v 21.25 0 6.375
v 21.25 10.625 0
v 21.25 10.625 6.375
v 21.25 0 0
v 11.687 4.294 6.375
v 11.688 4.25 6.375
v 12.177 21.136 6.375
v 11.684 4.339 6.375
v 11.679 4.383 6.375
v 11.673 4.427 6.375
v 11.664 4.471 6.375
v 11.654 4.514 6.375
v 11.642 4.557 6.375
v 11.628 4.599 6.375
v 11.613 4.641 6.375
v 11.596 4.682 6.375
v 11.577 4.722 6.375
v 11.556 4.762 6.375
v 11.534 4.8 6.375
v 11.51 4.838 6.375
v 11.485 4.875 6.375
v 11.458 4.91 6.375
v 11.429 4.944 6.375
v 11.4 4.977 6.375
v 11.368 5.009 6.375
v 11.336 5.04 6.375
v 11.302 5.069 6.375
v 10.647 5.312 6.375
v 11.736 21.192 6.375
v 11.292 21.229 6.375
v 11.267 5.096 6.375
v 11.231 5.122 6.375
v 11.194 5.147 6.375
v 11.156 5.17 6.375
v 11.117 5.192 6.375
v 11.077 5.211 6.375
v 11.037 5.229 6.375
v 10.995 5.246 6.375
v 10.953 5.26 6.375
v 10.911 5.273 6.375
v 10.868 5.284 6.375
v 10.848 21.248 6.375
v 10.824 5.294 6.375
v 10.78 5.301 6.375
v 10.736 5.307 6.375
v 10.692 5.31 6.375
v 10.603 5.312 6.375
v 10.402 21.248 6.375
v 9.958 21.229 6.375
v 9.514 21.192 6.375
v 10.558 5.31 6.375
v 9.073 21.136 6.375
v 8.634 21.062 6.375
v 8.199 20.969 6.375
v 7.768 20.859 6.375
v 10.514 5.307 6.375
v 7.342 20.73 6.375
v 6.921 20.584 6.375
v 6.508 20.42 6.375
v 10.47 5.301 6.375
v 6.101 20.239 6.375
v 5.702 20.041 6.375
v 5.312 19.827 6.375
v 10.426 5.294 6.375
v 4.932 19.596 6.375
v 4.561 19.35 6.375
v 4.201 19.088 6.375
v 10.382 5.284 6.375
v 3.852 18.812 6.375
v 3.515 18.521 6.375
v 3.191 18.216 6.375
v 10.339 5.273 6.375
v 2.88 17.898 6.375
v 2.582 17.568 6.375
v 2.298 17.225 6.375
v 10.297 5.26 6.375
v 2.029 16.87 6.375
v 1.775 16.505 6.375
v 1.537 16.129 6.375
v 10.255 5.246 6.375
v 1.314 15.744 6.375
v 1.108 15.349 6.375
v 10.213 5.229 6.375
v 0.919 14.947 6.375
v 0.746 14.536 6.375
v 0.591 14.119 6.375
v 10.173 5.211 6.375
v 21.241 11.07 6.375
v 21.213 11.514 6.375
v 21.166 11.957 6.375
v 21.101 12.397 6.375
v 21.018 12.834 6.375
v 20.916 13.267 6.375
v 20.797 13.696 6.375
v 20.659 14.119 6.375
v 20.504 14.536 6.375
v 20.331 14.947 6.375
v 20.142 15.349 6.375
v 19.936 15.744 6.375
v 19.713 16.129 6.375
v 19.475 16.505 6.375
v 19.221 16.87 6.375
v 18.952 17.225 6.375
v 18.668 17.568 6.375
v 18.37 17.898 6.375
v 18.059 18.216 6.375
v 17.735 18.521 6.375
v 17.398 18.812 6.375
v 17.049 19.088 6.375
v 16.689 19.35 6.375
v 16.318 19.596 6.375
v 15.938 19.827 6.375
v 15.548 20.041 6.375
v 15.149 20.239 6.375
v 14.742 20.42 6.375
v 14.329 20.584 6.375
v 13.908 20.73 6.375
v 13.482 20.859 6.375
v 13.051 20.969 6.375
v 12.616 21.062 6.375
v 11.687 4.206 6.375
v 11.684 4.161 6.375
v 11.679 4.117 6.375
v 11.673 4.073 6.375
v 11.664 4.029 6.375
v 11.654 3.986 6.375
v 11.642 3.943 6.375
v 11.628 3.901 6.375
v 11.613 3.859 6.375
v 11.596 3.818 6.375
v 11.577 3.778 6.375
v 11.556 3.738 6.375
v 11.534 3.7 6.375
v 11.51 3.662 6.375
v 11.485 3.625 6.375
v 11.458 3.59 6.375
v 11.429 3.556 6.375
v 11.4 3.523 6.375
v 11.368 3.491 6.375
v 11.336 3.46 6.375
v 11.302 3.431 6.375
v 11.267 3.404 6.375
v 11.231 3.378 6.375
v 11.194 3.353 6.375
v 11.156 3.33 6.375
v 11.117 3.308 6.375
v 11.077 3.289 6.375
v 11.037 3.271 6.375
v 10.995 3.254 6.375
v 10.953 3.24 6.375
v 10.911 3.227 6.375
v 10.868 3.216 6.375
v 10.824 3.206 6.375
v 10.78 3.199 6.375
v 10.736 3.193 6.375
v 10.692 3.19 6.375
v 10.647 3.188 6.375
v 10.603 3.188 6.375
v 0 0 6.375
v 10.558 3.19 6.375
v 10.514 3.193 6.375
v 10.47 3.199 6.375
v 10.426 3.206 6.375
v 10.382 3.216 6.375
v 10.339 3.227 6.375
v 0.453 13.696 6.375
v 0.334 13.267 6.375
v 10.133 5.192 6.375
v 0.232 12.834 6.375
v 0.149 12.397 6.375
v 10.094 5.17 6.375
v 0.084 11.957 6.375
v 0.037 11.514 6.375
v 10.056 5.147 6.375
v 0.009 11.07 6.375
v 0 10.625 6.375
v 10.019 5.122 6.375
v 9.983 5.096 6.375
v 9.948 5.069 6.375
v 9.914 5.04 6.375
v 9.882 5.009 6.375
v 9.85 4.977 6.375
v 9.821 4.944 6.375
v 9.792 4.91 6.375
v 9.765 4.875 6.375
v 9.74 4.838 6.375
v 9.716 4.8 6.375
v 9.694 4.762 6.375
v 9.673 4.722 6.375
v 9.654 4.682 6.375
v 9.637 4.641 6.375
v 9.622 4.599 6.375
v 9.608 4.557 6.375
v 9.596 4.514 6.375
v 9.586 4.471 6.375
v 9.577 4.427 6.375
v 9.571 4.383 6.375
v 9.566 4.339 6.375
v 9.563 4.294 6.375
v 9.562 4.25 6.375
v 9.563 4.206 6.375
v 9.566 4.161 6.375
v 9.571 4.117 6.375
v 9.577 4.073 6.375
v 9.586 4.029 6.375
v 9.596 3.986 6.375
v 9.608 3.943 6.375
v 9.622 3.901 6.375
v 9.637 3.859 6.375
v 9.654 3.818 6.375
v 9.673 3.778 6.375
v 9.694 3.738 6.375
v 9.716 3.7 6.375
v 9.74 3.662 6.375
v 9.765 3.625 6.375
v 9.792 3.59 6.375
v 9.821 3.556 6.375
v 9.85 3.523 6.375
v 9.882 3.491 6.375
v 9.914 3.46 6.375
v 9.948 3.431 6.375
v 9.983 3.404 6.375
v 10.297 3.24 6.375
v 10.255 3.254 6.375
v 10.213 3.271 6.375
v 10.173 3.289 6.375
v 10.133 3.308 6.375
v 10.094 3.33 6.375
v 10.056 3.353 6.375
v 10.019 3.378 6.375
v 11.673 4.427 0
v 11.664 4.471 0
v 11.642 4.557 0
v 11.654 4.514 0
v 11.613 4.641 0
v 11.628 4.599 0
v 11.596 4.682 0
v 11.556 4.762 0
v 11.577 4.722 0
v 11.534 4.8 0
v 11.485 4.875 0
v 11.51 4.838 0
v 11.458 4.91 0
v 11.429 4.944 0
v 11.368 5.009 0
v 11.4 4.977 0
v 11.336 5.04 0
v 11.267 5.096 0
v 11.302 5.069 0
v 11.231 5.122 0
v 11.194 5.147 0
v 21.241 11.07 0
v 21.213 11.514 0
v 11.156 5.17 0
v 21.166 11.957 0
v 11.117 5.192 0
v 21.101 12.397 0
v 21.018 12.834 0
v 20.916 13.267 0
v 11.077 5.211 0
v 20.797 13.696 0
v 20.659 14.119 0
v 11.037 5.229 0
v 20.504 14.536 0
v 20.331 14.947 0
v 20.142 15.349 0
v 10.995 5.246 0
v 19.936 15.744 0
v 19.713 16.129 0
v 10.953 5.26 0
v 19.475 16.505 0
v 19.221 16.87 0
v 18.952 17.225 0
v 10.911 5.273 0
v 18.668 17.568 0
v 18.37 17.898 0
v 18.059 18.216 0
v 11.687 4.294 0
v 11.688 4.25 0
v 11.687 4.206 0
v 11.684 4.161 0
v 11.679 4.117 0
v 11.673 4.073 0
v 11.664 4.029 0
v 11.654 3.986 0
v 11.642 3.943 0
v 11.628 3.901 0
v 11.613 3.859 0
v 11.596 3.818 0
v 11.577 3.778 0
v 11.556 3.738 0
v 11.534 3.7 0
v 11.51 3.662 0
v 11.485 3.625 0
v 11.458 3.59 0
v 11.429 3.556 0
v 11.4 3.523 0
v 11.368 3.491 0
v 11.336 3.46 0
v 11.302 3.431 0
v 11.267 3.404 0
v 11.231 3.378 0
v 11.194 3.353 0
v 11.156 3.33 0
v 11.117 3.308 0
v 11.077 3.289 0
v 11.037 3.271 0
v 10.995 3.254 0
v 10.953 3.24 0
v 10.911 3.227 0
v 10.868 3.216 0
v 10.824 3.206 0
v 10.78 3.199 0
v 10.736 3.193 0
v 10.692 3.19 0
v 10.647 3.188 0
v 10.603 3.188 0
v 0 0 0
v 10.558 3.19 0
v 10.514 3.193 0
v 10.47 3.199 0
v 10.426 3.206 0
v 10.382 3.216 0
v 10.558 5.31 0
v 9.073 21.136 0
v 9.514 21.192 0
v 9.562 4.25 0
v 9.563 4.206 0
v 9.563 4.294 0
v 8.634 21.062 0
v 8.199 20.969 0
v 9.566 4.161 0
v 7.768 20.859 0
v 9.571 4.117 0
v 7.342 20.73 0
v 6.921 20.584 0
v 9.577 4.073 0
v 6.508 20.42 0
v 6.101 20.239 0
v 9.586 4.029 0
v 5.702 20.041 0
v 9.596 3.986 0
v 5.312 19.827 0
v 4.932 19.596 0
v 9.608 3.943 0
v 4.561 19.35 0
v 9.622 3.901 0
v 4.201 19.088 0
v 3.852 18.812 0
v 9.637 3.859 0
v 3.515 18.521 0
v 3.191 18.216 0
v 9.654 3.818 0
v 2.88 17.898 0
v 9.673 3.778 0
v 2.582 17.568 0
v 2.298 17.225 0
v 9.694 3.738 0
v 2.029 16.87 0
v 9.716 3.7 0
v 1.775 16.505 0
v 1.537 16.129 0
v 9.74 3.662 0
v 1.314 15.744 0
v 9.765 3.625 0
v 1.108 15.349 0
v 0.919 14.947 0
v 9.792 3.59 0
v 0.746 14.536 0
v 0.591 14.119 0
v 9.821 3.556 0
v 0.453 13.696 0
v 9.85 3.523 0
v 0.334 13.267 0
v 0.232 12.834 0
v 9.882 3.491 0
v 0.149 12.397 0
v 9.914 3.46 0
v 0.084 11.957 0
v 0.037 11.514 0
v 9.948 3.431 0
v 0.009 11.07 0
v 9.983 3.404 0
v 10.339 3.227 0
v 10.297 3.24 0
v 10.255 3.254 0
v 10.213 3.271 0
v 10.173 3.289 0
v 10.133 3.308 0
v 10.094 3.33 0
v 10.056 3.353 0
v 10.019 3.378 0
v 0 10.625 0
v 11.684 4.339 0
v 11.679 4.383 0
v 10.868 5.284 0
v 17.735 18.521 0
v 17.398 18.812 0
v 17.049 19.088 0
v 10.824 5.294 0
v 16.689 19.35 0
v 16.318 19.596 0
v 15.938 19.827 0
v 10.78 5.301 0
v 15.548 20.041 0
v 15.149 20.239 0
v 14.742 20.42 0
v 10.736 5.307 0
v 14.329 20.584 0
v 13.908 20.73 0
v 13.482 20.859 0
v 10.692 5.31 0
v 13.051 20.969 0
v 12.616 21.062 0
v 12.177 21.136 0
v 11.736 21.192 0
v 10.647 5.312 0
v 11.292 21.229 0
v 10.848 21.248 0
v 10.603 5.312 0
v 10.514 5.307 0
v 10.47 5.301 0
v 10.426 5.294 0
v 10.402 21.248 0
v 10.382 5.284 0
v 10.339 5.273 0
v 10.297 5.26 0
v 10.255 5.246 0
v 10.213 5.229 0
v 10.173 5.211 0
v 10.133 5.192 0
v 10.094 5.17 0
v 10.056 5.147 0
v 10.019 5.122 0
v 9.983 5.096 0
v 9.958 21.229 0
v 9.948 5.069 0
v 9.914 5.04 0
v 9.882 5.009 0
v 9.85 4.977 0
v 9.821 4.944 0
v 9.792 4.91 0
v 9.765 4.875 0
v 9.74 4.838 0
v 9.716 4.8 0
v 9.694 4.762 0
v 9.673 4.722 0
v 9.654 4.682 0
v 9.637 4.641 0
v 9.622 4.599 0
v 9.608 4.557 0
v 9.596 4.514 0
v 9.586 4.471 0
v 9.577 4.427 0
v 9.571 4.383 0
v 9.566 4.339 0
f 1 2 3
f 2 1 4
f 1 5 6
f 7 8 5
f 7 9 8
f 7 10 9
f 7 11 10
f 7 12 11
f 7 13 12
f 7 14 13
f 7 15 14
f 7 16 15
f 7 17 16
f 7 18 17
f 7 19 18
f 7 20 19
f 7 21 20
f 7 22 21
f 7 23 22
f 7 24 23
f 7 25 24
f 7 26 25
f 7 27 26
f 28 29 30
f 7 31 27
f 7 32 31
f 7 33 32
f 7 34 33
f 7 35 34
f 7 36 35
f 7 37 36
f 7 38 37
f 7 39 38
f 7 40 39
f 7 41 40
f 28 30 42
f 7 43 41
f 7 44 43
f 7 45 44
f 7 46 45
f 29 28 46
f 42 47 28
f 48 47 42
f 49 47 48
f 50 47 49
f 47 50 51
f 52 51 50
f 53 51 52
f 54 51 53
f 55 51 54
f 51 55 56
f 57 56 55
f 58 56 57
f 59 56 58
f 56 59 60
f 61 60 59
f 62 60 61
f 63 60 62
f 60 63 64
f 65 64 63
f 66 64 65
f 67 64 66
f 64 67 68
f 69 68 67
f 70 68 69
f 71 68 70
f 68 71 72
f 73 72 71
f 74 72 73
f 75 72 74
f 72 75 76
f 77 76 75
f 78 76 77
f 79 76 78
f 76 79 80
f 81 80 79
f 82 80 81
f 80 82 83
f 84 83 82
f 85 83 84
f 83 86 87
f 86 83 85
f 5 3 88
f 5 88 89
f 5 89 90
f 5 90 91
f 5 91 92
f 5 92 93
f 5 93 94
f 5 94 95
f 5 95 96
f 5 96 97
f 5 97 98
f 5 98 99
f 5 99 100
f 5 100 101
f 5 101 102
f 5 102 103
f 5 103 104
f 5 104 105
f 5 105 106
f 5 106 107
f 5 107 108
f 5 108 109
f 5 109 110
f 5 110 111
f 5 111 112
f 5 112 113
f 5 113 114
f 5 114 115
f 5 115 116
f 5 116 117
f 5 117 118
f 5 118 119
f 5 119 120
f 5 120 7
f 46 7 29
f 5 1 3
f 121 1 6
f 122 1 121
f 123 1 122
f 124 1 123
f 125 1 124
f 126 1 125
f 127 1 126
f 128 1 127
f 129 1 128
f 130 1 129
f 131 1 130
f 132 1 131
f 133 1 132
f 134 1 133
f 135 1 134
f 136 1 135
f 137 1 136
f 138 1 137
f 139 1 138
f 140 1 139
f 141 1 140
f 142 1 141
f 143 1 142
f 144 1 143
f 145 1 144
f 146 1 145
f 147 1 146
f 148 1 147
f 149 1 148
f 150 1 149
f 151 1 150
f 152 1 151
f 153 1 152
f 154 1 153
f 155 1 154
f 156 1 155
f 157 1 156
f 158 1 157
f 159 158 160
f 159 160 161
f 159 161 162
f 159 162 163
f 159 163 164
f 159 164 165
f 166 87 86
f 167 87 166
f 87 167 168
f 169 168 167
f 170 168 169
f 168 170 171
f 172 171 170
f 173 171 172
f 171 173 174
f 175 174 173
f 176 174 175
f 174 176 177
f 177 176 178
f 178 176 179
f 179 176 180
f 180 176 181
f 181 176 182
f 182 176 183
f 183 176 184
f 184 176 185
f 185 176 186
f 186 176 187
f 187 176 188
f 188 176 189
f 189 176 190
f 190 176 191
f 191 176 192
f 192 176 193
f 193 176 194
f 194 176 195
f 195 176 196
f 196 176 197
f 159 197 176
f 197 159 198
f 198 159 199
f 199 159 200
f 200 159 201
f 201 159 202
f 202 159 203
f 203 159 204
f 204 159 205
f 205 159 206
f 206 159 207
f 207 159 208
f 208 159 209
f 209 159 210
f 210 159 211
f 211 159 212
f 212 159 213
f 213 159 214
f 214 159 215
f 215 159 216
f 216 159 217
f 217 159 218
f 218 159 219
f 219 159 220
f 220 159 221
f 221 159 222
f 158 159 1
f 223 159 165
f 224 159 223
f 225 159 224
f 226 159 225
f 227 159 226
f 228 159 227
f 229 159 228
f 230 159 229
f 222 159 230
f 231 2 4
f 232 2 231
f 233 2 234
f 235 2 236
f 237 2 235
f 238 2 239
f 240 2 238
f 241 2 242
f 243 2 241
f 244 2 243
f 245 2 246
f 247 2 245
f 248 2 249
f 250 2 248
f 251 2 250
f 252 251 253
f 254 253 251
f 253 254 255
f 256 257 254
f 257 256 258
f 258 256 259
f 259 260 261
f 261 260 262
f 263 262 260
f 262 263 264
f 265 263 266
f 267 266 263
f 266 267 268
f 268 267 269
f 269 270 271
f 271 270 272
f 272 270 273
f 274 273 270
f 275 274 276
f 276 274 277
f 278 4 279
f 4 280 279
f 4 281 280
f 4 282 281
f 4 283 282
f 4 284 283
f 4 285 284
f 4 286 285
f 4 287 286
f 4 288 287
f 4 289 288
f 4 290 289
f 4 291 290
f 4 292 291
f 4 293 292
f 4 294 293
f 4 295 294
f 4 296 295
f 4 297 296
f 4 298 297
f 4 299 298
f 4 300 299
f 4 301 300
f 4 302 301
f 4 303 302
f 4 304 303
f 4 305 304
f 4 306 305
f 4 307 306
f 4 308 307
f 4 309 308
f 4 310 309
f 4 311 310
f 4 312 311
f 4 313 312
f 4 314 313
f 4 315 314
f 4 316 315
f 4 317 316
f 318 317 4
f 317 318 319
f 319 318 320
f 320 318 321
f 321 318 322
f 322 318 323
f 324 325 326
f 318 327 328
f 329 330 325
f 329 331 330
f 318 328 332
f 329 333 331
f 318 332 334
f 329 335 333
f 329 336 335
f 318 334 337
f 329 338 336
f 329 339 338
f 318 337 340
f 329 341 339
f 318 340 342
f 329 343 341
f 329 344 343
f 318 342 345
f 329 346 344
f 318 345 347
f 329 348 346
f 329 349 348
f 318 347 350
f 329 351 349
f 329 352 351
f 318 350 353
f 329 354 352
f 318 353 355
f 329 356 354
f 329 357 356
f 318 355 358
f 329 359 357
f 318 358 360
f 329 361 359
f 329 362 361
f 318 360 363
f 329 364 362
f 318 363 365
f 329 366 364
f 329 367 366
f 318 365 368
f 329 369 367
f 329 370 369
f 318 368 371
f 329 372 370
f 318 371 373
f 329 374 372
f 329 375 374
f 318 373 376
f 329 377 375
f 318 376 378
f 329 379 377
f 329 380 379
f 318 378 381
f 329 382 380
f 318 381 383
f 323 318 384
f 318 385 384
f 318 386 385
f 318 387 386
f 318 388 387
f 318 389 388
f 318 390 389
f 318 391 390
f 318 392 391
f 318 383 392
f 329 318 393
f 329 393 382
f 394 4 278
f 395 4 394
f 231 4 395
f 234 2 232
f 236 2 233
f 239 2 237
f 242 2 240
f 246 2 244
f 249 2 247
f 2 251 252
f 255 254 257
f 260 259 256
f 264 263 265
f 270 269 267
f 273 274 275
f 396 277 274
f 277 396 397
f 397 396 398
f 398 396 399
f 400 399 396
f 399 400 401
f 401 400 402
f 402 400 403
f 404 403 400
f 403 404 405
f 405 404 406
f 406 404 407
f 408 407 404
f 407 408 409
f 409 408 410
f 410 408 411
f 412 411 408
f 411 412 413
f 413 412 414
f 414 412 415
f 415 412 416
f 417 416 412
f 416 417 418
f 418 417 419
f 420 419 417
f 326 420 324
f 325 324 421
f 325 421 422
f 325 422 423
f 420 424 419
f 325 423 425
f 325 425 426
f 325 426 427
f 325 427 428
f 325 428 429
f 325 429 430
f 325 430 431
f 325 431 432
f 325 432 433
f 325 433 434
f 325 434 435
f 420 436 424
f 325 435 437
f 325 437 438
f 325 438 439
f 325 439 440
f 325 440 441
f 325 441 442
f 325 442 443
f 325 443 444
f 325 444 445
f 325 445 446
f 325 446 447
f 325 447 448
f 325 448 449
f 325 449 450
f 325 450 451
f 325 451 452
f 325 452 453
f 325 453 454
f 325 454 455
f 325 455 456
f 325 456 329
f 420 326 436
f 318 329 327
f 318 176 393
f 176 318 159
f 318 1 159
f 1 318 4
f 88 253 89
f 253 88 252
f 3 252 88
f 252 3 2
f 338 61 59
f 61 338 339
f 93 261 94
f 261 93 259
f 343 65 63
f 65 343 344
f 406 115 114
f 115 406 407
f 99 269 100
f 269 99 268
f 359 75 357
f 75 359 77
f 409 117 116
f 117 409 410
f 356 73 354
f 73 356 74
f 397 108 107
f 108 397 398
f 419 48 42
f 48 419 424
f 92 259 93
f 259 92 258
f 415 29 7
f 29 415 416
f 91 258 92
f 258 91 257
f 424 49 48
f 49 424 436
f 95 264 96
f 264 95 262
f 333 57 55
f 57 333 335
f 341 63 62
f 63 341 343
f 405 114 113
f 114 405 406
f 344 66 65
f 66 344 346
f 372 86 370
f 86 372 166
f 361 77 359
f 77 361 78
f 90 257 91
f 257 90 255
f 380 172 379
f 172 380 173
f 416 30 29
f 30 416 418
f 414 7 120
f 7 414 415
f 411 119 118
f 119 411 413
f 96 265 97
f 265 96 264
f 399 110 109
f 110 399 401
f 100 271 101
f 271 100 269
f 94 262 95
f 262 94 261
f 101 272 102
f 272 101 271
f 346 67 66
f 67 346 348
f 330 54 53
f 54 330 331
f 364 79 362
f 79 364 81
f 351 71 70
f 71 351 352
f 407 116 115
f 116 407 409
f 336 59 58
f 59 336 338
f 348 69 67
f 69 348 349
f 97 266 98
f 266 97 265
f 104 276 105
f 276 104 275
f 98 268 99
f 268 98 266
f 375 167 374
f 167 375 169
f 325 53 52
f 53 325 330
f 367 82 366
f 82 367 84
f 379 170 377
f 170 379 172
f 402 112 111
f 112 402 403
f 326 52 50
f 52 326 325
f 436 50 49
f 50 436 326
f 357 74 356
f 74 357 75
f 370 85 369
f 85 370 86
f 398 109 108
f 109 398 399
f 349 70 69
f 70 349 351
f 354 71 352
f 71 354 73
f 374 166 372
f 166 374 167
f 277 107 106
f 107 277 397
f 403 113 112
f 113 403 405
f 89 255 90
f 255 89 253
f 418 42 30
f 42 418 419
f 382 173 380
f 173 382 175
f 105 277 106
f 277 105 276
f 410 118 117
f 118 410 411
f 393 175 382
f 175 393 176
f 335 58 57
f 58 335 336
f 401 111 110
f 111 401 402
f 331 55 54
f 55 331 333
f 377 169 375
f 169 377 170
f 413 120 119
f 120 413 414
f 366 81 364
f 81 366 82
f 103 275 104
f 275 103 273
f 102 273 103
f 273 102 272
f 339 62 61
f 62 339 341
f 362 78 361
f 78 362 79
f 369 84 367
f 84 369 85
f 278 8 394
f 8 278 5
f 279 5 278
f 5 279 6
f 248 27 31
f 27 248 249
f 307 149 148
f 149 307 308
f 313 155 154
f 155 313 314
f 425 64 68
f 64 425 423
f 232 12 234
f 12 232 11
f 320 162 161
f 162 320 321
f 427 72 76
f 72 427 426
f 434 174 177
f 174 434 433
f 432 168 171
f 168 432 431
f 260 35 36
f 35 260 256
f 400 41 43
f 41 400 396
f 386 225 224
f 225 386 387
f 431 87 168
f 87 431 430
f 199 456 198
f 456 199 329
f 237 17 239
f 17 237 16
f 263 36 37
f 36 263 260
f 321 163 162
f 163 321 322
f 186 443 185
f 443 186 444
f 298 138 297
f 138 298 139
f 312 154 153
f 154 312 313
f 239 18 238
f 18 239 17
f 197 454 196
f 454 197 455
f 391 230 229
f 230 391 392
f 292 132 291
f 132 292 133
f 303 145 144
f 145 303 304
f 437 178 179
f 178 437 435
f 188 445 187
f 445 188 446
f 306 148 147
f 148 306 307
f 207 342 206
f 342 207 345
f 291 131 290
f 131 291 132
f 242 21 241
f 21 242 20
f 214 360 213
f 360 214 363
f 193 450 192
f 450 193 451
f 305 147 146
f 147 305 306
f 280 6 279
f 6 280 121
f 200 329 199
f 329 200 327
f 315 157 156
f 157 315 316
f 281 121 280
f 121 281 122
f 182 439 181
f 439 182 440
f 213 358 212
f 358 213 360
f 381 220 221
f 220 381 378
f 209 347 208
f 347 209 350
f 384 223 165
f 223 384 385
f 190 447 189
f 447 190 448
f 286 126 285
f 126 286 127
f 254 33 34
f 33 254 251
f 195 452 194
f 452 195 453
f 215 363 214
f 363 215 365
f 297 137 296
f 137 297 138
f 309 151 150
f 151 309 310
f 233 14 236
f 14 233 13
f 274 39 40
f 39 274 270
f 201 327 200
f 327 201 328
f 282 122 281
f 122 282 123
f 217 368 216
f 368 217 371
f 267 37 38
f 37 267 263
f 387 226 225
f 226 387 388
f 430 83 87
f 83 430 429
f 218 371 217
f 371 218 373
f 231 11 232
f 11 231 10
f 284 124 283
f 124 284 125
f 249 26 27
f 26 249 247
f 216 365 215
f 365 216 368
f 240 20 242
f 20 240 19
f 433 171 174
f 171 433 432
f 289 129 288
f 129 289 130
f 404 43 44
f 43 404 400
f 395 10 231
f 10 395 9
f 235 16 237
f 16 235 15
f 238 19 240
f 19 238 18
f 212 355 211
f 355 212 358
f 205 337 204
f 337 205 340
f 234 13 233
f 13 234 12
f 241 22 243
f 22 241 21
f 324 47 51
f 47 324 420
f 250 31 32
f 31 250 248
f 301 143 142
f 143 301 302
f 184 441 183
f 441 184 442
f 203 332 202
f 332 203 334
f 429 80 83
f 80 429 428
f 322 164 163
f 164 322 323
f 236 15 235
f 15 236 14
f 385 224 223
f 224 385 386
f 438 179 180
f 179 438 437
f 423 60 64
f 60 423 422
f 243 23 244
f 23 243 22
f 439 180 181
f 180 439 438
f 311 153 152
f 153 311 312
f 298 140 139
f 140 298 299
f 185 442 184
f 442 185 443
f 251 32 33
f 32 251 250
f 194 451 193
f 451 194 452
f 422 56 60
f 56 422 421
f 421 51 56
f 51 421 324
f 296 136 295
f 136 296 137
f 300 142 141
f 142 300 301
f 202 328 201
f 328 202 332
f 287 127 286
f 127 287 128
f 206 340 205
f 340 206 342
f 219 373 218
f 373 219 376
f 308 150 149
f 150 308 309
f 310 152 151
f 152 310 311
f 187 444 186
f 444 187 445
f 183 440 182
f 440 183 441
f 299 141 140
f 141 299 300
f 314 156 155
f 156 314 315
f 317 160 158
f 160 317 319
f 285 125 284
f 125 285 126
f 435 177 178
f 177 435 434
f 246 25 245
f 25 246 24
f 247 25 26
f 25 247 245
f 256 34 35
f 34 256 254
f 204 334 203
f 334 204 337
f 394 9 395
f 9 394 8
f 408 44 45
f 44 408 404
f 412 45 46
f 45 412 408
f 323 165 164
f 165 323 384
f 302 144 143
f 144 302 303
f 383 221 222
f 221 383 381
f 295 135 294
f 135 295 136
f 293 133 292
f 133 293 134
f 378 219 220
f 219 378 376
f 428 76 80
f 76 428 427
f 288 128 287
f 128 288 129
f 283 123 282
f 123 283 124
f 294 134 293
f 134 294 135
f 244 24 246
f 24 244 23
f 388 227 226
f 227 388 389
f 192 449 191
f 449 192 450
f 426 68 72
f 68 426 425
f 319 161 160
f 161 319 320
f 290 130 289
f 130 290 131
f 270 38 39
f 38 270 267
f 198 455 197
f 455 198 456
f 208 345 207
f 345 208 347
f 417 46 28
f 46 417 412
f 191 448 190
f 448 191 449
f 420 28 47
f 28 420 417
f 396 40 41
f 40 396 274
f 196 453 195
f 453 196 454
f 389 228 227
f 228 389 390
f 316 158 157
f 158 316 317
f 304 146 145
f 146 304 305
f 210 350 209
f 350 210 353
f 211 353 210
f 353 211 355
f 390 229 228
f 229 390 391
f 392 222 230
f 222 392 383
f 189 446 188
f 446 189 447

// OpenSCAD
$fn = 150;

difference() {
	union() {
		cube(size = [21.25, 10.625, 6.375]);
		translate(v = [10.625, 10.625, 0]) {
			cylinder(d = 21.25, h = 6.375);
		}
	}
	translate(v = [10.625, 4.25, -1]) {
		cylinder(d = 2.125, h = 8.375);
	}
}
